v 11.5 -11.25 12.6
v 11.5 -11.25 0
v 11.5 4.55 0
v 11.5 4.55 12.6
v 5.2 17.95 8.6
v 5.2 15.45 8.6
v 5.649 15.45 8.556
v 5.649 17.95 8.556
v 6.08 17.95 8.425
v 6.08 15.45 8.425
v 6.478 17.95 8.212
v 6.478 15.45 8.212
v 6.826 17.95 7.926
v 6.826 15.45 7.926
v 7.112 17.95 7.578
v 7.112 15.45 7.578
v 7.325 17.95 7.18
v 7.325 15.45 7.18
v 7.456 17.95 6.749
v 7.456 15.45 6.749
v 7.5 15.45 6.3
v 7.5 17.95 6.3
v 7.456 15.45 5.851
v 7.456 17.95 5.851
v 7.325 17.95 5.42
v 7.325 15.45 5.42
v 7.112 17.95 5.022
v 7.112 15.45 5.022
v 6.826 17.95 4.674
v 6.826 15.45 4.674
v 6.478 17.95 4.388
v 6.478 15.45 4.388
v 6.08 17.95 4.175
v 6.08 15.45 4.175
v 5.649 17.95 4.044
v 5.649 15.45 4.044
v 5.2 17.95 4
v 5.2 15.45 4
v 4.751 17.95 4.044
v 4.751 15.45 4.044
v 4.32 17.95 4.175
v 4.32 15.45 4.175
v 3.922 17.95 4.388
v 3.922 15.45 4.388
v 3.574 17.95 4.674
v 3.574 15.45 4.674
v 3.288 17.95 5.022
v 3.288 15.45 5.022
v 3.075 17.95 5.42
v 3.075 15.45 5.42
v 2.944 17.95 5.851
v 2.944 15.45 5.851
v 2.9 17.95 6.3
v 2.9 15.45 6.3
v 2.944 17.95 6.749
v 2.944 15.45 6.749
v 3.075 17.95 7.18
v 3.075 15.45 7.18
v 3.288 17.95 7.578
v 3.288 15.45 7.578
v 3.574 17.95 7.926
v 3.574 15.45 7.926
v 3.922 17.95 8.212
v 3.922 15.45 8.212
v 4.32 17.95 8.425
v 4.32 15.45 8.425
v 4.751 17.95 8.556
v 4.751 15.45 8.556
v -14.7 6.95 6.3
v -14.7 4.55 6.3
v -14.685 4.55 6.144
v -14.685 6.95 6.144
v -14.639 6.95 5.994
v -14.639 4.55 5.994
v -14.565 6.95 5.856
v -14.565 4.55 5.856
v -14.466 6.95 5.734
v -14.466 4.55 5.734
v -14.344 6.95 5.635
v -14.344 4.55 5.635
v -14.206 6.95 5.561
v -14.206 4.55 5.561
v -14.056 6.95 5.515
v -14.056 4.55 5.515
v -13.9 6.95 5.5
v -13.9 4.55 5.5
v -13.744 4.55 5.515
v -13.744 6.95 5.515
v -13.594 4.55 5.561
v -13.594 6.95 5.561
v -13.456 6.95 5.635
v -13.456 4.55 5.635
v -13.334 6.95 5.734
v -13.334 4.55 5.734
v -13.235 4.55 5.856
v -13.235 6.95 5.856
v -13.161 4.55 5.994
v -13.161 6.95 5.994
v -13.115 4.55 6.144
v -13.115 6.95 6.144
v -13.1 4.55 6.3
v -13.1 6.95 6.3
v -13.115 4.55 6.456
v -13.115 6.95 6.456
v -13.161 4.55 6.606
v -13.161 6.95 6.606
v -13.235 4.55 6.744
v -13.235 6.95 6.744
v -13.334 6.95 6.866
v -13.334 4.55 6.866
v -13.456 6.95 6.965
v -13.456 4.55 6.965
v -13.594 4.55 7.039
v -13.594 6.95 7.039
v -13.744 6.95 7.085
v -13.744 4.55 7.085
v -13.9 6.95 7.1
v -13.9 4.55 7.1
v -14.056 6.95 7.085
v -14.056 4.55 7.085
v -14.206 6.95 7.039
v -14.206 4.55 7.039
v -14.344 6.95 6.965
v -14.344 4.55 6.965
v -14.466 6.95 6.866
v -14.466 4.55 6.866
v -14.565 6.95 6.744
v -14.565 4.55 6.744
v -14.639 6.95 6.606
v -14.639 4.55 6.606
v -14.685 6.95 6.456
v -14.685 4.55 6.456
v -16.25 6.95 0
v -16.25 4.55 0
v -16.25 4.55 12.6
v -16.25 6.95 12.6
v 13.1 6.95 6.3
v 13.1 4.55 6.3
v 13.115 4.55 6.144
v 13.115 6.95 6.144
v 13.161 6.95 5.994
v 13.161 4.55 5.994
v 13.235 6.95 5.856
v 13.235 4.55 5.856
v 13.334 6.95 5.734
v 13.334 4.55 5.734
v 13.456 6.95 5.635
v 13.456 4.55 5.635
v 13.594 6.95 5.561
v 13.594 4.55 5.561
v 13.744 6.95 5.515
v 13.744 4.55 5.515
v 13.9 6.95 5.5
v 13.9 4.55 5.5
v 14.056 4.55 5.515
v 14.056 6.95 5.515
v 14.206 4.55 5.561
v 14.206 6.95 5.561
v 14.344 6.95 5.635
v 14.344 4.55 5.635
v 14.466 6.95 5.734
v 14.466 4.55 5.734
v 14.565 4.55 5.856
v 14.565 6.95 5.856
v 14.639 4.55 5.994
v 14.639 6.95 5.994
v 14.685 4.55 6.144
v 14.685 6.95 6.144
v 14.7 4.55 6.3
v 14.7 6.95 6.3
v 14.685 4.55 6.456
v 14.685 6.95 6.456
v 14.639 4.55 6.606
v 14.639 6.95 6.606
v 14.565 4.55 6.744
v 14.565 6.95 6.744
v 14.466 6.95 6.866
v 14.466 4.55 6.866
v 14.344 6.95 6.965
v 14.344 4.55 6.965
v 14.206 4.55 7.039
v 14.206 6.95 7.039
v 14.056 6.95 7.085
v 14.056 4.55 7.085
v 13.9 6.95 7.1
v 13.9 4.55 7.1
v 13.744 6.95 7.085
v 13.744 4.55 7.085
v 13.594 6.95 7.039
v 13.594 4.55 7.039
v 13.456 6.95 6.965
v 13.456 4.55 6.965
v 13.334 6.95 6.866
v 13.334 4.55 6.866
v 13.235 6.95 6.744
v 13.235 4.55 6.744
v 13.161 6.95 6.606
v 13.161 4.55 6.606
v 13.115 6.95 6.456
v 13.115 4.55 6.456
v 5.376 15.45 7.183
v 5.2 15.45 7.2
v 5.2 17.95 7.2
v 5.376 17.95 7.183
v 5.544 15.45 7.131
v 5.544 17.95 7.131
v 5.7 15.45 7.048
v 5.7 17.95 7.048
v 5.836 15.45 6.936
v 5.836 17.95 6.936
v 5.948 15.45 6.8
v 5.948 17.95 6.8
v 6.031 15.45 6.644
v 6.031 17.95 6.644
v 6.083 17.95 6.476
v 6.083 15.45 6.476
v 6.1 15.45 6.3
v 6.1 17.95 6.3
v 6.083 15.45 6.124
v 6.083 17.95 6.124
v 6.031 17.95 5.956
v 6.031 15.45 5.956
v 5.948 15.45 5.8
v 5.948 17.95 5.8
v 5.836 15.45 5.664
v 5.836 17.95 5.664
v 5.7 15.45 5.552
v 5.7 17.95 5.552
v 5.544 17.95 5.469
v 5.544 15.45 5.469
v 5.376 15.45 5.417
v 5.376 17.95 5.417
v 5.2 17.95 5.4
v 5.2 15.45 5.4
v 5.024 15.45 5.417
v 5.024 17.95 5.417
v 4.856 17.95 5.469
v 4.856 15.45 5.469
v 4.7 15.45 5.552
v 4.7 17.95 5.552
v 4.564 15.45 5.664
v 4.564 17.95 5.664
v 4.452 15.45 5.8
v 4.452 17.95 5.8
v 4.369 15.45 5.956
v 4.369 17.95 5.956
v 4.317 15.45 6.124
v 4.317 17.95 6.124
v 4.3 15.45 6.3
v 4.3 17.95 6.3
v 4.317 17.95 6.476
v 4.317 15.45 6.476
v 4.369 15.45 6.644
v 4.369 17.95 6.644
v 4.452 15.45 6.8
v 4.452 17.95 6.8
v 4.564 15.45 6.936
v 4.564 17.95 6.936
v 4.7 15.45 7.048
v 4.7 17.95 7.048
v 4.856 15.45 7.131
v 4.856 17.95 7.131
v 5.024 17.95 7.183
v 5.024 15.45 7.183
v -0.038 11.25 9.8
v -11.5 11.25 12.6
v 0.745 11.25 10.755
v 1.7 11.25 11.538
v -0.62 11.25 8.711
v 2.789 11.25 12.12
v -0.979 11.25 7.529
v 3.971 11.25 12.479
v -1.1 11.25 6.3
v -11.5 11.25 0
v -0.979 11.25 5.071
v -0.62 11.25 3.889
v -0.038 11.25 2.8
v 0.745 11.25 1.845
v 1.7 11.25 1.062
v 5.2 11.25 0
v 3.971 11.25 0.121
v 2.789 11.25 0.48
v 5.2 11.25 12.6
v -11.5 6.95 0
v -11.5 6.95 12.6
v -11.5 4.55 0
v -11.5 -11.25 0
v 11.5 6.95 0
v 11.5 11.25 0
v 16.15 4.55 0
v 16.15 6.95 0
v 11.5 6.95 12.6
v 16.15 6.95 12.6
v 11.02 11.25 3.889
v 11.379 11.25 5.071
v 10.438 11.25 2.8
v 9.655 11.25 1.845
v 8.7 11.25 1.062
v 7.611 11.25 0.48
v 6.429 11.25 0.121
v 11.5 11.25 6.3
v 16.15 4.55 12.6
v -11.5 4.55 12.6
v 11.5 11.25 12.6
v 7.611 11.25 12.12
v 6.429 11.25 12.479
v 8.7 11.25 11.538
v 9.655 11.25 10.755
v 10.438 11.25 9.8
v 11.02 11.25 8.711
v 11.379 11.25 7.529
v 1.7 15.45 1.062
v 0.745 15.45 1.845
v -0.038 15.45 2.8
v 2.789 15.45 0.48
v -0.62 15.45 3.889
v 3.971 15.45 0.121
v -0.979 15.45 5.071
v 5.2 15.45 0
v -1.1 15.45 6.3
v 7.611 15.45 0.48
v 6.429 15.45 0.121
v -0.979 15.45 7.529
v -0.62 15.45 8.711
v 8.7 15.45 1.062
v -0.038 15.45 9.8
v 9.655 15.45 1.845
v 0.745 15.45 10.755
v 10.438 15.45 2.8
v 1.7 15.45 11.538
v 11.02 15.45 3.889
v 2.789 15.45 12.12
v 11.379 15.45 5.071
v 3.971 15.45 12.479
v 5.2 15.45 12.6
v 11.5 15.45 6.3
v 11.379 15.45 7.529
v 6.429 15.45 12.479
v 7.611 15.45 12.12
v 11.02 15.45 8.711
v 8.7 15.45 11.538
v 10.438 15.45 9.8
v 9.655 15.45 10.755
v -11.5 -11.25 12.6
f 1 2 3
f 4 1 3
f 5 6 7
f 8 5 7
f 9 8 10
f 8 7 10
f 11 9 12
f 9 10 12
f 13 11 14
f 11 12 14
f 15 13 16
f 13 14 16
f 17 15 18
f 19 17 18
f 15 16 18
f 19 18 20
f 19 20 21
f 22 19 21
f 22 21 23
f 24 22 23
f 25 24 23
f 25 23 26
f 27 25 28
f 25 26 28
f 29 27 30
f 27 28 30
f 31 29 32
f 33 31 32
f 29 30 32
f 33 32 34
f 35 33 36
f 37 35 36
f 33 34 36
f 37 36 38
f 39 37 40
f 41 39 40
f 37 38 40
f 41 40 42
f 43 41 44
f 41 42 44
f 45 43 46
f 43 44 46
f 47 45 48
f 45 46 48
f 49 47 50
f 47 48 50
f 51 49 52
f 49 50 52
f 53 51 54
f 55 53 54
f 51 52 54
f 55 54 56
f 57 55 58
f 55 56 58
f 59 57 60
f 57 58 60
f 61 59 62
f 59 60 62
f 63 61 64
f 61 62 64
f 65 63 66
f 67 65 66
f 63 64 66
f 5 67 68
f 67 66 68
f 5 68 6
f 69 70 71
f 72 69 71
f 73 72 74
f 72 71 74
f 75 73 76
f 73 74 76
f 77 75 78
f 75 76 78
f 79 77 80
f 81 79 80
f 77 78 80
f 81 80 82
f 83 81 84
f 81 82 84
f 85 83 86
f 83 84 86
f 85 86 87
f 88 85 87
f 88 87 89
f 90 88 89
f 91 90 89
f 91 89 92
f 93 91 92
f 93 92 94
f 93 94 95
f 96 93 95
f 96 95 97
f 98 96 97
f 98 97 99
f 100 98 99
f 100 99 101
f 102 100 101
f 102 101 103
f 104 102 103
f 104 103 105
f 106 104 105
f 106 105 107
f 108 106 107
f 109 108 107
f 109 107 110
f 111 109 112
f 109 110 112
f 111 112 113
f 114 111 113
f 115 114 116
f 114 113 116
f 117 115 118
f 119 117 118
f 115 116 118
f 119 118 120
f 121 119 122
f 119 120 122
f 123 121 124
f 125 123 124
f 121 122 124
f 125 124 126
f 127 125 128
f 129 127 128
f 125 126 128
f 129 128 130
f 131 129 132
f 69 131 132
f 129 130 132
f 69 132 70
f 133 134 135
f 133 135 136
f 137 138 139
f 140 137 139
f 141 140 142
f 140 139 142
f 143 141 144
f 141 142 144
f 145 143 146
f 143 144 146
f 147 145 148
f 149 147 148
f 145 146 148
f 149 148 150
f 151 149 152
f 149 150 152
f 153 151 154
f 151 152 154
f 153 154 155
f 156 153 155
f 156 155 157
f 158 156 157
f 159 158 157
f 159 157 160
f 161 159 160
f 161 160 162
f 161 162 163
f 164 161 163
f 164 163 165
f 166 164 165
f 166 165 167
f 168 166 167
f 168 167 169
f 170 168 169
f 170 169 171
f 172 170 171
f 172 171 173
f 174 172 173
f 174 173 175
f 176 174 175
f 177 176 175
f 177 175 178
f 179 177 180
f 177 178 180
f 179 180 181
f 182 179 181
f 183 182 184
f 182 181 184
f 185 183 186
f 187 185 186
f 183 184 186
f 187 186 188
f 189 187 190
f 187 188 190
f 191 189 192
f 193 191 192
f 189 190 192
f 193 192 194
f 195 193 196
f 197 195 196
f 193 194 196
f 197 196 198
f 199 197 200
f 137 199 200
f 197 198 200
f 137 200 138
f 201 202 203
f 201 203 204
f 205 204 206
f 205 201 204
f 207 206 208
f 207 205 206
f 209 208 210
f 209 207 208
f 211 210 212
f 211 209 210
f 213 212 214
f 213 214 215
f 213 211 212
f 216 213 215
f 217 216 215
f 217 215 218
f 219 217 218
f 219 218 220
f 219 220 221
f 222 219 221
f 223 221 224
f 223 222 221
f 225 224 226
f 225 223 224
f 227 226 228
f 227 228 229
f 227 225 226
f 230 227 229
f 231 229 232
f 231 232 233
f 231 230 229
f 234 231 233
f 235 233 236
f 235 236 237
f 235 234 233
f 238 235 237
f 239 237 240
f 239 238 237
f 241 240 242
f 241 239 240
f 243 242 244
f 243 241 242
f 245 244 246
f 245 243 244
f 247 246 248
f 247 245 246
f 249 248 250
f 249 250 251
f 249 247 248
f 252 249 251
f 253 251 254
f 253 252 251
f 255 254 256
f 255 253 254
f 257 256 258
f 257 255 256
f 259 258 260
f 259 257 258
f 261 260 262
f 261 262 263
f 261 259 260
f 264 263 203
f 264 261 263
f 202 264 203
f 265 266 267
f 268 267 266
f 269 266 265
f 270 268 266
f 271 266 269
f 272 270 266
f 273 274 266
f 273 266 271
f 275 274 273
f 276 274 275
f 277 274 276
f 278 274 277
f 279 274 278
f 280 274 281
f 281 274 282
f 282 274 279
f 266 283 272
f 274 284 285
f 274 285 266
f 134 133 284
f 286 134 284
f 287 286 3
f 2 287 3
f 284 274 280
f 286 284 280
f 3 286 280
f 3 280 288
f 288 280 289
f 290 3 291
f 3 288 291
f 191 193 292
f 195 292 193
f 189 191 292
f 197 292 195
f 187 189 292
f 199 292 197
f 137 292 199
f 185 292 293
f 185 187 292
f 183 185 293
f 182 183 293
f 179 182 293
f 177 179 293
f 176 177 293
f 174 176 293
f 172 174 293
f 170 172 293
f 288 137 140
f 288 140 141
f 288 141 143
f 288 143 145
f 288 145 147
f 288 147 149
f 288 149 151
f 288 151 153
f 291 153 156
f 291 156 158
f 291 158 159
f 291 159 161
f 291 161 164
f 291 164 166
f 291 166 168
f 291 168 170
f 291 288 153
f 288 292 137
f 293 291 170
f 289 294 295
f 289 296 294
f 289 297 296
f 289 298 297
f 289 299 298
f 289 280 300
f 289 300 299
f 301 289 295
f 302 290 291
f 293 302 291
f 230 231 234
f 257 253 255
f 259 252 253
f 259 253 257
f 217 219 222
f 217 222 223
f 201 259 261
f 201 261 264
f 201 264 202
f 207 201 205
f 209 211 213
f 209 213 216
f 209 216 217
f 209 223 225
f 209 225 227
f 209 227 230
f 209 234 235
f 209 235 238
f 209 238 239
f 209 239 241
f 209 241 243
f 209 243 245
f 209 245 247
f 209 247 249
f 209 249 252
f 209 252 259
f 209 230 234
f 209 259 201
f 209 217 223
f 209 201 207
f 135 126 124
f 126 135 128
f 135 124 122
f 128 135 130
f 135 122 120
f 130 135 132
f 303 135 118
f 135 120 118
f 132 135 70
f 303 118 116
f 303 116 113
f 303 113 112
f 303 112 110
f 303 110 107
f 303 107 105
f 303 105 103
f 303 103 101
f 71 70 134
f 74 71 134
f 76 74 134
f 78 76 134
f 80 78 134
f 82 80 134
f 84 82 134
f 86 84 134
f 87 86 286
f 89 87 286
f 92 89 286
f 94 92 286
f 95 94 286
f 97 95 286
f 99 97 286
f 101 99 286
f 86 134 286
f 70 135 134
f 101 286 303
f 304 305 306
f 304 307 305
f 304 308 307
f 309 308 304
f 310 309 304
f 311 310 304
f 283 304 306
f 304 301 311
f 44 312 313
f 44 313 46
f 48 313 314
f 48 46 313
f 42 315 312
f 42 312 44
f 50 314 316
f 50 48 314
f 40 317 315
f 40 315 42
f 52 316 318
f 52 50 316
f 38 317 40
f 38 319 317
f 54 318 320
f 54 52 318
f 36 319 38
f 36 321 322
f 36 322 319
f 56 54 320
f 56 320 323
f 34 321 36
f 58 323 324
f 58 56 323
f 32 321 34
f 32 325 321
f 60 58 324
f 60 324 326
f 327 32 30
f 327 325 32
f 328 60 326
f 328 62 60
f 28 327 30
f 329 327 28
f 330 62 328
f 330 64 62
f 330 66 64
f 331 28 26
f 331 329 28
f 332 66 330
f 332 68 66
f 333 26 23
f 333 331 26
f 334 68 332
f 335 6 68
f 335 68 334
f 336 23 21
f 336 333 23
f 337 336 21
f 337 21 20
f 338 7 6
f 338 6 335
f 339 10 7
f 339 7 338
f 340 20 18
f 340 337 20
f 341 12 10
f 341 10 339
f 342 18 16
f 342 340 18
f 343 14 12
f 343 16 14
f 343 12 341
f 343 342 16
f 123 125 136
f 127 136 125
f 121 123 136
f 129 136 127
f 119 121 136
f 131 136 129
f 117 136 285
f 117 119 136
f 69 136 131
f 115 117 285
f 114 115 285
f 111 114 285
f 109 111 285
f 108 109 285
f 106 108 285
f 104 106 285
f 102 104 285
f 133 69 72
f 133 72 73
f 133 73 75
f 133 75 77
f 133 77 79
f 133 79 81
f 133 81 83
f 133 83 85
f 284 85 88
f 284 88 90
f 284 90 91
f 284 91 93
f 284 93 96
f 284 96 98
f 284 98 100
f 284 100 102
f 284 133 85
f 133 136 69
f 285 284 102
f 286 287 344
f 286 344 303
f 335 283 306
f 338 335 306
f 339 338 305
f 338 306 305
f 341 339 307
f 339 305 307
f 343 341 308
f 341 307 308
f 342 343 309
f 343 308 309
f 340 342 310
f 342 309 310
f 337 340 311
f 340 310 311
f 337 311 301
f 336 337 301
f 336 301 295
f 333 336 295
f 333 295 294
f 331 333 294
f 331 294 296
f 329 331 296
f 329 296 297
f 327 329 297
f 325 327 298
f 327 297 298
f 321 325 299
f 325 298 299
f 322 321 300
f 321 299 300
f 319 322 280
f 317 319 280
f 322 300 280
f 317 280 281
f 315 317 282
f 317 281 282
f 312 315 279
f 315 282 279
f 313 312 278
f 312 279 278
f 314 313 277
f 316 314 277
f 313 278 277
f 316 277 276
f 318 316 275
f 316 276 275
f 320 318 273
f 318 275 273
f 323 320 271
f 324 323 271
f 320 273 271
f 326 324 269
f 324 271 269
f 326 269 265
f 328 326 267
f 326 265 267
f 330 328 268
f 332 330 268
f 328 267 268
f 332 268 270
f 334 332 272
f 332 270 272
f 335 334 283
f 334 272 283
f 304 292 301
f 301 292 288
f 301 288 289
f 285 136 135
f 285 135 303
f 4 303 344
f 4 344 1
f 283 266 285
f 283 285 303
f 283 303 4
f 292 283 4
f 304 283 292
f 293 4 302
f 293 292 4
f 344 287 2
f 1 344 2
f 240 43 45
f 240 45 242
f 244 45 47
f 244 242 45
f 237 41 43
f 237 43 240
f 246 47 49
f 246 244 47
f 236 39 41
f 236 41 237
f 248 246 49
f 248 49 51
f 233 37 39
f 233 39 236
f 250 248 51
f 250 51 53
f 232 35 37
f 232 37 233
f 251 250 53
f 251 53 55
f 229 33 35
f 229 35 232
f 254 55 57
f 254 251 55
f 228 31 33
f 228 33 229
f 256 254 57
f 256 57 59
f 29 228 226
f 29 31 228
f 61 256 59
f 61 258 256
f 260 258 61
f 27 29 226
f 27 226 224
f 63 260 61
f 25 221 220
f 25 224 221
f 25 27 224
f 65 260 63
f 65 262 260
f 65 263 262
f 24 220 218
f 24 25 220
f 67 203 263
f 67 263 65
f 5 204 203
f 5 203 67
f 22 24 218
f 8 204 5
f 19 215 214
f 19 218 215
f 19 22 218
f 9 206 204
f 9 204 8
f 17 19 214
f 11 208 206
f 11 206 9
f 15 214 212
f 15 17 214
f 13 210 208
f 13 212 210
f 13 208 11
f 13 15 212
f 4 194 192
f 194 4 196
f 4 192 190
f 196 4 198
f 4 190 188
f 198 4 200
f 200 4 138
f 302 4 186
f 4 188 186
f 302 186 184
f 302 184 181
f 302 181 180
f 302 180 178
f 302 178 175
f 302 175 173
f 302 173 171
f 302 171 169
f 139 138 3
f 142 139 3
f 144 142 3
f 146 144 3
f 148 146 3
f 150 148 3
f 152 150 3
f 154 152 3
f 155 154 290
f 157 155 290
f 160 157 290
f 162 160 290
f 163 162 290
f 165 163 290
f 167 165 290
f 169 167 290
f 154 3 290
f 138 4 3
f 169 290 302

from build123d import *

# Parameters (mm, degrees)
SKETCH_5_W          = 23
SKETCH_5_H          = 22.5
EXTRUDE_4_DEPTH     = 12.6
SKETCH_6_W          = 32.4
SKETCH_6_H          = 2.4
EXTRUDE_5_DEPTH     = 12.6
SKETCH_7_R          = 6.3
EXTRUDE_6_DEPTH     = 4.2
SKETCH_9_R          = 2.3
EXTRUDE_8_DEPTH     = 2.5
SKETCH_10_R         = 0.9
CUT_EXTRUDE_1_DEPTH = 2.5
M2X0_4_1_D          = 1.6


with BuildPart() as part:
    # ｽｹｯﾁ5 → ﾎﾞｽ - 押し出し4 (new body)
    with BuildSketch(Plane.XY):
        Rectangle(SKETCH_5_W, SKETCH_5_H)
    extrude(amount=EXTRUDE_4_DEPTH)

    # ｽｹｯﾁ6 → ﾎﾞｽ - 押し出し5 (add)
    with BuildSketch(Plane.XY):
        with Locations((-0.05, 5.75)):
            Rectangle(SKETCH_6_W, SKETCH_6_H)
    extrude(amount=EXTRUDE_5_DEPTH)

    # ｽｹｯﾁ7 → ﾎﾞｽ - 押し出し6 (add)
    with BuildSketch(Plane(origin=(0, 11.25, 0), x_dir=(1, 0, 0), z_dir=(0, 1, 0))):
        with Locations(Location((5.2, -6.3, 0), (0, 0, 270))):
            Circle(SKETCH_7_R)
    extrude(amount=EXTRUDE_6_DEPTH)

    # ｽｹｯﾁ9 → ﾎﾞｽ - 押し出し8 (add)
    with BuildSketch(Plane(origin=(0, 15.45, 0), x_dir=(1, 0, 0), z_dir=(0, 1, 0))):
        with Locations(Location((5.2, -6.3, 0), (0, 0, 270))):
            Circle(SKETCH_9_R)
    extrude(amount=EXTRUDE_8_DEPTH)

    # ｽｹｯﾁ10 → ｶｯﾄ - 押し出し1 (cut)
    with BuildSketch(Plane(origin=(0, 15.45, 0), x_dir=(1, 0, 0), z_dir=(0, 1, 0))):
        with Locations(Location((5.2, -6.3, 0), (0, 0, 270))):
            Circle(SKETCH_10_R)
    extrude(amount=CUT_EXTRUDE_1_DEPTH, mode=Mode.SUBTRACT)

    # M2x0.4 ねじ穴1 (through all)
    with Locations(Plane(origin=(0, 6.95, 0), x_dir=(1, 0, 0), z_dir=(0, 1, 0))):
        with Locations((-13.9, -6.3), (13.9, -6.3)):
            Hole(M2X0_4_1_D / 2)


solid = part.part
